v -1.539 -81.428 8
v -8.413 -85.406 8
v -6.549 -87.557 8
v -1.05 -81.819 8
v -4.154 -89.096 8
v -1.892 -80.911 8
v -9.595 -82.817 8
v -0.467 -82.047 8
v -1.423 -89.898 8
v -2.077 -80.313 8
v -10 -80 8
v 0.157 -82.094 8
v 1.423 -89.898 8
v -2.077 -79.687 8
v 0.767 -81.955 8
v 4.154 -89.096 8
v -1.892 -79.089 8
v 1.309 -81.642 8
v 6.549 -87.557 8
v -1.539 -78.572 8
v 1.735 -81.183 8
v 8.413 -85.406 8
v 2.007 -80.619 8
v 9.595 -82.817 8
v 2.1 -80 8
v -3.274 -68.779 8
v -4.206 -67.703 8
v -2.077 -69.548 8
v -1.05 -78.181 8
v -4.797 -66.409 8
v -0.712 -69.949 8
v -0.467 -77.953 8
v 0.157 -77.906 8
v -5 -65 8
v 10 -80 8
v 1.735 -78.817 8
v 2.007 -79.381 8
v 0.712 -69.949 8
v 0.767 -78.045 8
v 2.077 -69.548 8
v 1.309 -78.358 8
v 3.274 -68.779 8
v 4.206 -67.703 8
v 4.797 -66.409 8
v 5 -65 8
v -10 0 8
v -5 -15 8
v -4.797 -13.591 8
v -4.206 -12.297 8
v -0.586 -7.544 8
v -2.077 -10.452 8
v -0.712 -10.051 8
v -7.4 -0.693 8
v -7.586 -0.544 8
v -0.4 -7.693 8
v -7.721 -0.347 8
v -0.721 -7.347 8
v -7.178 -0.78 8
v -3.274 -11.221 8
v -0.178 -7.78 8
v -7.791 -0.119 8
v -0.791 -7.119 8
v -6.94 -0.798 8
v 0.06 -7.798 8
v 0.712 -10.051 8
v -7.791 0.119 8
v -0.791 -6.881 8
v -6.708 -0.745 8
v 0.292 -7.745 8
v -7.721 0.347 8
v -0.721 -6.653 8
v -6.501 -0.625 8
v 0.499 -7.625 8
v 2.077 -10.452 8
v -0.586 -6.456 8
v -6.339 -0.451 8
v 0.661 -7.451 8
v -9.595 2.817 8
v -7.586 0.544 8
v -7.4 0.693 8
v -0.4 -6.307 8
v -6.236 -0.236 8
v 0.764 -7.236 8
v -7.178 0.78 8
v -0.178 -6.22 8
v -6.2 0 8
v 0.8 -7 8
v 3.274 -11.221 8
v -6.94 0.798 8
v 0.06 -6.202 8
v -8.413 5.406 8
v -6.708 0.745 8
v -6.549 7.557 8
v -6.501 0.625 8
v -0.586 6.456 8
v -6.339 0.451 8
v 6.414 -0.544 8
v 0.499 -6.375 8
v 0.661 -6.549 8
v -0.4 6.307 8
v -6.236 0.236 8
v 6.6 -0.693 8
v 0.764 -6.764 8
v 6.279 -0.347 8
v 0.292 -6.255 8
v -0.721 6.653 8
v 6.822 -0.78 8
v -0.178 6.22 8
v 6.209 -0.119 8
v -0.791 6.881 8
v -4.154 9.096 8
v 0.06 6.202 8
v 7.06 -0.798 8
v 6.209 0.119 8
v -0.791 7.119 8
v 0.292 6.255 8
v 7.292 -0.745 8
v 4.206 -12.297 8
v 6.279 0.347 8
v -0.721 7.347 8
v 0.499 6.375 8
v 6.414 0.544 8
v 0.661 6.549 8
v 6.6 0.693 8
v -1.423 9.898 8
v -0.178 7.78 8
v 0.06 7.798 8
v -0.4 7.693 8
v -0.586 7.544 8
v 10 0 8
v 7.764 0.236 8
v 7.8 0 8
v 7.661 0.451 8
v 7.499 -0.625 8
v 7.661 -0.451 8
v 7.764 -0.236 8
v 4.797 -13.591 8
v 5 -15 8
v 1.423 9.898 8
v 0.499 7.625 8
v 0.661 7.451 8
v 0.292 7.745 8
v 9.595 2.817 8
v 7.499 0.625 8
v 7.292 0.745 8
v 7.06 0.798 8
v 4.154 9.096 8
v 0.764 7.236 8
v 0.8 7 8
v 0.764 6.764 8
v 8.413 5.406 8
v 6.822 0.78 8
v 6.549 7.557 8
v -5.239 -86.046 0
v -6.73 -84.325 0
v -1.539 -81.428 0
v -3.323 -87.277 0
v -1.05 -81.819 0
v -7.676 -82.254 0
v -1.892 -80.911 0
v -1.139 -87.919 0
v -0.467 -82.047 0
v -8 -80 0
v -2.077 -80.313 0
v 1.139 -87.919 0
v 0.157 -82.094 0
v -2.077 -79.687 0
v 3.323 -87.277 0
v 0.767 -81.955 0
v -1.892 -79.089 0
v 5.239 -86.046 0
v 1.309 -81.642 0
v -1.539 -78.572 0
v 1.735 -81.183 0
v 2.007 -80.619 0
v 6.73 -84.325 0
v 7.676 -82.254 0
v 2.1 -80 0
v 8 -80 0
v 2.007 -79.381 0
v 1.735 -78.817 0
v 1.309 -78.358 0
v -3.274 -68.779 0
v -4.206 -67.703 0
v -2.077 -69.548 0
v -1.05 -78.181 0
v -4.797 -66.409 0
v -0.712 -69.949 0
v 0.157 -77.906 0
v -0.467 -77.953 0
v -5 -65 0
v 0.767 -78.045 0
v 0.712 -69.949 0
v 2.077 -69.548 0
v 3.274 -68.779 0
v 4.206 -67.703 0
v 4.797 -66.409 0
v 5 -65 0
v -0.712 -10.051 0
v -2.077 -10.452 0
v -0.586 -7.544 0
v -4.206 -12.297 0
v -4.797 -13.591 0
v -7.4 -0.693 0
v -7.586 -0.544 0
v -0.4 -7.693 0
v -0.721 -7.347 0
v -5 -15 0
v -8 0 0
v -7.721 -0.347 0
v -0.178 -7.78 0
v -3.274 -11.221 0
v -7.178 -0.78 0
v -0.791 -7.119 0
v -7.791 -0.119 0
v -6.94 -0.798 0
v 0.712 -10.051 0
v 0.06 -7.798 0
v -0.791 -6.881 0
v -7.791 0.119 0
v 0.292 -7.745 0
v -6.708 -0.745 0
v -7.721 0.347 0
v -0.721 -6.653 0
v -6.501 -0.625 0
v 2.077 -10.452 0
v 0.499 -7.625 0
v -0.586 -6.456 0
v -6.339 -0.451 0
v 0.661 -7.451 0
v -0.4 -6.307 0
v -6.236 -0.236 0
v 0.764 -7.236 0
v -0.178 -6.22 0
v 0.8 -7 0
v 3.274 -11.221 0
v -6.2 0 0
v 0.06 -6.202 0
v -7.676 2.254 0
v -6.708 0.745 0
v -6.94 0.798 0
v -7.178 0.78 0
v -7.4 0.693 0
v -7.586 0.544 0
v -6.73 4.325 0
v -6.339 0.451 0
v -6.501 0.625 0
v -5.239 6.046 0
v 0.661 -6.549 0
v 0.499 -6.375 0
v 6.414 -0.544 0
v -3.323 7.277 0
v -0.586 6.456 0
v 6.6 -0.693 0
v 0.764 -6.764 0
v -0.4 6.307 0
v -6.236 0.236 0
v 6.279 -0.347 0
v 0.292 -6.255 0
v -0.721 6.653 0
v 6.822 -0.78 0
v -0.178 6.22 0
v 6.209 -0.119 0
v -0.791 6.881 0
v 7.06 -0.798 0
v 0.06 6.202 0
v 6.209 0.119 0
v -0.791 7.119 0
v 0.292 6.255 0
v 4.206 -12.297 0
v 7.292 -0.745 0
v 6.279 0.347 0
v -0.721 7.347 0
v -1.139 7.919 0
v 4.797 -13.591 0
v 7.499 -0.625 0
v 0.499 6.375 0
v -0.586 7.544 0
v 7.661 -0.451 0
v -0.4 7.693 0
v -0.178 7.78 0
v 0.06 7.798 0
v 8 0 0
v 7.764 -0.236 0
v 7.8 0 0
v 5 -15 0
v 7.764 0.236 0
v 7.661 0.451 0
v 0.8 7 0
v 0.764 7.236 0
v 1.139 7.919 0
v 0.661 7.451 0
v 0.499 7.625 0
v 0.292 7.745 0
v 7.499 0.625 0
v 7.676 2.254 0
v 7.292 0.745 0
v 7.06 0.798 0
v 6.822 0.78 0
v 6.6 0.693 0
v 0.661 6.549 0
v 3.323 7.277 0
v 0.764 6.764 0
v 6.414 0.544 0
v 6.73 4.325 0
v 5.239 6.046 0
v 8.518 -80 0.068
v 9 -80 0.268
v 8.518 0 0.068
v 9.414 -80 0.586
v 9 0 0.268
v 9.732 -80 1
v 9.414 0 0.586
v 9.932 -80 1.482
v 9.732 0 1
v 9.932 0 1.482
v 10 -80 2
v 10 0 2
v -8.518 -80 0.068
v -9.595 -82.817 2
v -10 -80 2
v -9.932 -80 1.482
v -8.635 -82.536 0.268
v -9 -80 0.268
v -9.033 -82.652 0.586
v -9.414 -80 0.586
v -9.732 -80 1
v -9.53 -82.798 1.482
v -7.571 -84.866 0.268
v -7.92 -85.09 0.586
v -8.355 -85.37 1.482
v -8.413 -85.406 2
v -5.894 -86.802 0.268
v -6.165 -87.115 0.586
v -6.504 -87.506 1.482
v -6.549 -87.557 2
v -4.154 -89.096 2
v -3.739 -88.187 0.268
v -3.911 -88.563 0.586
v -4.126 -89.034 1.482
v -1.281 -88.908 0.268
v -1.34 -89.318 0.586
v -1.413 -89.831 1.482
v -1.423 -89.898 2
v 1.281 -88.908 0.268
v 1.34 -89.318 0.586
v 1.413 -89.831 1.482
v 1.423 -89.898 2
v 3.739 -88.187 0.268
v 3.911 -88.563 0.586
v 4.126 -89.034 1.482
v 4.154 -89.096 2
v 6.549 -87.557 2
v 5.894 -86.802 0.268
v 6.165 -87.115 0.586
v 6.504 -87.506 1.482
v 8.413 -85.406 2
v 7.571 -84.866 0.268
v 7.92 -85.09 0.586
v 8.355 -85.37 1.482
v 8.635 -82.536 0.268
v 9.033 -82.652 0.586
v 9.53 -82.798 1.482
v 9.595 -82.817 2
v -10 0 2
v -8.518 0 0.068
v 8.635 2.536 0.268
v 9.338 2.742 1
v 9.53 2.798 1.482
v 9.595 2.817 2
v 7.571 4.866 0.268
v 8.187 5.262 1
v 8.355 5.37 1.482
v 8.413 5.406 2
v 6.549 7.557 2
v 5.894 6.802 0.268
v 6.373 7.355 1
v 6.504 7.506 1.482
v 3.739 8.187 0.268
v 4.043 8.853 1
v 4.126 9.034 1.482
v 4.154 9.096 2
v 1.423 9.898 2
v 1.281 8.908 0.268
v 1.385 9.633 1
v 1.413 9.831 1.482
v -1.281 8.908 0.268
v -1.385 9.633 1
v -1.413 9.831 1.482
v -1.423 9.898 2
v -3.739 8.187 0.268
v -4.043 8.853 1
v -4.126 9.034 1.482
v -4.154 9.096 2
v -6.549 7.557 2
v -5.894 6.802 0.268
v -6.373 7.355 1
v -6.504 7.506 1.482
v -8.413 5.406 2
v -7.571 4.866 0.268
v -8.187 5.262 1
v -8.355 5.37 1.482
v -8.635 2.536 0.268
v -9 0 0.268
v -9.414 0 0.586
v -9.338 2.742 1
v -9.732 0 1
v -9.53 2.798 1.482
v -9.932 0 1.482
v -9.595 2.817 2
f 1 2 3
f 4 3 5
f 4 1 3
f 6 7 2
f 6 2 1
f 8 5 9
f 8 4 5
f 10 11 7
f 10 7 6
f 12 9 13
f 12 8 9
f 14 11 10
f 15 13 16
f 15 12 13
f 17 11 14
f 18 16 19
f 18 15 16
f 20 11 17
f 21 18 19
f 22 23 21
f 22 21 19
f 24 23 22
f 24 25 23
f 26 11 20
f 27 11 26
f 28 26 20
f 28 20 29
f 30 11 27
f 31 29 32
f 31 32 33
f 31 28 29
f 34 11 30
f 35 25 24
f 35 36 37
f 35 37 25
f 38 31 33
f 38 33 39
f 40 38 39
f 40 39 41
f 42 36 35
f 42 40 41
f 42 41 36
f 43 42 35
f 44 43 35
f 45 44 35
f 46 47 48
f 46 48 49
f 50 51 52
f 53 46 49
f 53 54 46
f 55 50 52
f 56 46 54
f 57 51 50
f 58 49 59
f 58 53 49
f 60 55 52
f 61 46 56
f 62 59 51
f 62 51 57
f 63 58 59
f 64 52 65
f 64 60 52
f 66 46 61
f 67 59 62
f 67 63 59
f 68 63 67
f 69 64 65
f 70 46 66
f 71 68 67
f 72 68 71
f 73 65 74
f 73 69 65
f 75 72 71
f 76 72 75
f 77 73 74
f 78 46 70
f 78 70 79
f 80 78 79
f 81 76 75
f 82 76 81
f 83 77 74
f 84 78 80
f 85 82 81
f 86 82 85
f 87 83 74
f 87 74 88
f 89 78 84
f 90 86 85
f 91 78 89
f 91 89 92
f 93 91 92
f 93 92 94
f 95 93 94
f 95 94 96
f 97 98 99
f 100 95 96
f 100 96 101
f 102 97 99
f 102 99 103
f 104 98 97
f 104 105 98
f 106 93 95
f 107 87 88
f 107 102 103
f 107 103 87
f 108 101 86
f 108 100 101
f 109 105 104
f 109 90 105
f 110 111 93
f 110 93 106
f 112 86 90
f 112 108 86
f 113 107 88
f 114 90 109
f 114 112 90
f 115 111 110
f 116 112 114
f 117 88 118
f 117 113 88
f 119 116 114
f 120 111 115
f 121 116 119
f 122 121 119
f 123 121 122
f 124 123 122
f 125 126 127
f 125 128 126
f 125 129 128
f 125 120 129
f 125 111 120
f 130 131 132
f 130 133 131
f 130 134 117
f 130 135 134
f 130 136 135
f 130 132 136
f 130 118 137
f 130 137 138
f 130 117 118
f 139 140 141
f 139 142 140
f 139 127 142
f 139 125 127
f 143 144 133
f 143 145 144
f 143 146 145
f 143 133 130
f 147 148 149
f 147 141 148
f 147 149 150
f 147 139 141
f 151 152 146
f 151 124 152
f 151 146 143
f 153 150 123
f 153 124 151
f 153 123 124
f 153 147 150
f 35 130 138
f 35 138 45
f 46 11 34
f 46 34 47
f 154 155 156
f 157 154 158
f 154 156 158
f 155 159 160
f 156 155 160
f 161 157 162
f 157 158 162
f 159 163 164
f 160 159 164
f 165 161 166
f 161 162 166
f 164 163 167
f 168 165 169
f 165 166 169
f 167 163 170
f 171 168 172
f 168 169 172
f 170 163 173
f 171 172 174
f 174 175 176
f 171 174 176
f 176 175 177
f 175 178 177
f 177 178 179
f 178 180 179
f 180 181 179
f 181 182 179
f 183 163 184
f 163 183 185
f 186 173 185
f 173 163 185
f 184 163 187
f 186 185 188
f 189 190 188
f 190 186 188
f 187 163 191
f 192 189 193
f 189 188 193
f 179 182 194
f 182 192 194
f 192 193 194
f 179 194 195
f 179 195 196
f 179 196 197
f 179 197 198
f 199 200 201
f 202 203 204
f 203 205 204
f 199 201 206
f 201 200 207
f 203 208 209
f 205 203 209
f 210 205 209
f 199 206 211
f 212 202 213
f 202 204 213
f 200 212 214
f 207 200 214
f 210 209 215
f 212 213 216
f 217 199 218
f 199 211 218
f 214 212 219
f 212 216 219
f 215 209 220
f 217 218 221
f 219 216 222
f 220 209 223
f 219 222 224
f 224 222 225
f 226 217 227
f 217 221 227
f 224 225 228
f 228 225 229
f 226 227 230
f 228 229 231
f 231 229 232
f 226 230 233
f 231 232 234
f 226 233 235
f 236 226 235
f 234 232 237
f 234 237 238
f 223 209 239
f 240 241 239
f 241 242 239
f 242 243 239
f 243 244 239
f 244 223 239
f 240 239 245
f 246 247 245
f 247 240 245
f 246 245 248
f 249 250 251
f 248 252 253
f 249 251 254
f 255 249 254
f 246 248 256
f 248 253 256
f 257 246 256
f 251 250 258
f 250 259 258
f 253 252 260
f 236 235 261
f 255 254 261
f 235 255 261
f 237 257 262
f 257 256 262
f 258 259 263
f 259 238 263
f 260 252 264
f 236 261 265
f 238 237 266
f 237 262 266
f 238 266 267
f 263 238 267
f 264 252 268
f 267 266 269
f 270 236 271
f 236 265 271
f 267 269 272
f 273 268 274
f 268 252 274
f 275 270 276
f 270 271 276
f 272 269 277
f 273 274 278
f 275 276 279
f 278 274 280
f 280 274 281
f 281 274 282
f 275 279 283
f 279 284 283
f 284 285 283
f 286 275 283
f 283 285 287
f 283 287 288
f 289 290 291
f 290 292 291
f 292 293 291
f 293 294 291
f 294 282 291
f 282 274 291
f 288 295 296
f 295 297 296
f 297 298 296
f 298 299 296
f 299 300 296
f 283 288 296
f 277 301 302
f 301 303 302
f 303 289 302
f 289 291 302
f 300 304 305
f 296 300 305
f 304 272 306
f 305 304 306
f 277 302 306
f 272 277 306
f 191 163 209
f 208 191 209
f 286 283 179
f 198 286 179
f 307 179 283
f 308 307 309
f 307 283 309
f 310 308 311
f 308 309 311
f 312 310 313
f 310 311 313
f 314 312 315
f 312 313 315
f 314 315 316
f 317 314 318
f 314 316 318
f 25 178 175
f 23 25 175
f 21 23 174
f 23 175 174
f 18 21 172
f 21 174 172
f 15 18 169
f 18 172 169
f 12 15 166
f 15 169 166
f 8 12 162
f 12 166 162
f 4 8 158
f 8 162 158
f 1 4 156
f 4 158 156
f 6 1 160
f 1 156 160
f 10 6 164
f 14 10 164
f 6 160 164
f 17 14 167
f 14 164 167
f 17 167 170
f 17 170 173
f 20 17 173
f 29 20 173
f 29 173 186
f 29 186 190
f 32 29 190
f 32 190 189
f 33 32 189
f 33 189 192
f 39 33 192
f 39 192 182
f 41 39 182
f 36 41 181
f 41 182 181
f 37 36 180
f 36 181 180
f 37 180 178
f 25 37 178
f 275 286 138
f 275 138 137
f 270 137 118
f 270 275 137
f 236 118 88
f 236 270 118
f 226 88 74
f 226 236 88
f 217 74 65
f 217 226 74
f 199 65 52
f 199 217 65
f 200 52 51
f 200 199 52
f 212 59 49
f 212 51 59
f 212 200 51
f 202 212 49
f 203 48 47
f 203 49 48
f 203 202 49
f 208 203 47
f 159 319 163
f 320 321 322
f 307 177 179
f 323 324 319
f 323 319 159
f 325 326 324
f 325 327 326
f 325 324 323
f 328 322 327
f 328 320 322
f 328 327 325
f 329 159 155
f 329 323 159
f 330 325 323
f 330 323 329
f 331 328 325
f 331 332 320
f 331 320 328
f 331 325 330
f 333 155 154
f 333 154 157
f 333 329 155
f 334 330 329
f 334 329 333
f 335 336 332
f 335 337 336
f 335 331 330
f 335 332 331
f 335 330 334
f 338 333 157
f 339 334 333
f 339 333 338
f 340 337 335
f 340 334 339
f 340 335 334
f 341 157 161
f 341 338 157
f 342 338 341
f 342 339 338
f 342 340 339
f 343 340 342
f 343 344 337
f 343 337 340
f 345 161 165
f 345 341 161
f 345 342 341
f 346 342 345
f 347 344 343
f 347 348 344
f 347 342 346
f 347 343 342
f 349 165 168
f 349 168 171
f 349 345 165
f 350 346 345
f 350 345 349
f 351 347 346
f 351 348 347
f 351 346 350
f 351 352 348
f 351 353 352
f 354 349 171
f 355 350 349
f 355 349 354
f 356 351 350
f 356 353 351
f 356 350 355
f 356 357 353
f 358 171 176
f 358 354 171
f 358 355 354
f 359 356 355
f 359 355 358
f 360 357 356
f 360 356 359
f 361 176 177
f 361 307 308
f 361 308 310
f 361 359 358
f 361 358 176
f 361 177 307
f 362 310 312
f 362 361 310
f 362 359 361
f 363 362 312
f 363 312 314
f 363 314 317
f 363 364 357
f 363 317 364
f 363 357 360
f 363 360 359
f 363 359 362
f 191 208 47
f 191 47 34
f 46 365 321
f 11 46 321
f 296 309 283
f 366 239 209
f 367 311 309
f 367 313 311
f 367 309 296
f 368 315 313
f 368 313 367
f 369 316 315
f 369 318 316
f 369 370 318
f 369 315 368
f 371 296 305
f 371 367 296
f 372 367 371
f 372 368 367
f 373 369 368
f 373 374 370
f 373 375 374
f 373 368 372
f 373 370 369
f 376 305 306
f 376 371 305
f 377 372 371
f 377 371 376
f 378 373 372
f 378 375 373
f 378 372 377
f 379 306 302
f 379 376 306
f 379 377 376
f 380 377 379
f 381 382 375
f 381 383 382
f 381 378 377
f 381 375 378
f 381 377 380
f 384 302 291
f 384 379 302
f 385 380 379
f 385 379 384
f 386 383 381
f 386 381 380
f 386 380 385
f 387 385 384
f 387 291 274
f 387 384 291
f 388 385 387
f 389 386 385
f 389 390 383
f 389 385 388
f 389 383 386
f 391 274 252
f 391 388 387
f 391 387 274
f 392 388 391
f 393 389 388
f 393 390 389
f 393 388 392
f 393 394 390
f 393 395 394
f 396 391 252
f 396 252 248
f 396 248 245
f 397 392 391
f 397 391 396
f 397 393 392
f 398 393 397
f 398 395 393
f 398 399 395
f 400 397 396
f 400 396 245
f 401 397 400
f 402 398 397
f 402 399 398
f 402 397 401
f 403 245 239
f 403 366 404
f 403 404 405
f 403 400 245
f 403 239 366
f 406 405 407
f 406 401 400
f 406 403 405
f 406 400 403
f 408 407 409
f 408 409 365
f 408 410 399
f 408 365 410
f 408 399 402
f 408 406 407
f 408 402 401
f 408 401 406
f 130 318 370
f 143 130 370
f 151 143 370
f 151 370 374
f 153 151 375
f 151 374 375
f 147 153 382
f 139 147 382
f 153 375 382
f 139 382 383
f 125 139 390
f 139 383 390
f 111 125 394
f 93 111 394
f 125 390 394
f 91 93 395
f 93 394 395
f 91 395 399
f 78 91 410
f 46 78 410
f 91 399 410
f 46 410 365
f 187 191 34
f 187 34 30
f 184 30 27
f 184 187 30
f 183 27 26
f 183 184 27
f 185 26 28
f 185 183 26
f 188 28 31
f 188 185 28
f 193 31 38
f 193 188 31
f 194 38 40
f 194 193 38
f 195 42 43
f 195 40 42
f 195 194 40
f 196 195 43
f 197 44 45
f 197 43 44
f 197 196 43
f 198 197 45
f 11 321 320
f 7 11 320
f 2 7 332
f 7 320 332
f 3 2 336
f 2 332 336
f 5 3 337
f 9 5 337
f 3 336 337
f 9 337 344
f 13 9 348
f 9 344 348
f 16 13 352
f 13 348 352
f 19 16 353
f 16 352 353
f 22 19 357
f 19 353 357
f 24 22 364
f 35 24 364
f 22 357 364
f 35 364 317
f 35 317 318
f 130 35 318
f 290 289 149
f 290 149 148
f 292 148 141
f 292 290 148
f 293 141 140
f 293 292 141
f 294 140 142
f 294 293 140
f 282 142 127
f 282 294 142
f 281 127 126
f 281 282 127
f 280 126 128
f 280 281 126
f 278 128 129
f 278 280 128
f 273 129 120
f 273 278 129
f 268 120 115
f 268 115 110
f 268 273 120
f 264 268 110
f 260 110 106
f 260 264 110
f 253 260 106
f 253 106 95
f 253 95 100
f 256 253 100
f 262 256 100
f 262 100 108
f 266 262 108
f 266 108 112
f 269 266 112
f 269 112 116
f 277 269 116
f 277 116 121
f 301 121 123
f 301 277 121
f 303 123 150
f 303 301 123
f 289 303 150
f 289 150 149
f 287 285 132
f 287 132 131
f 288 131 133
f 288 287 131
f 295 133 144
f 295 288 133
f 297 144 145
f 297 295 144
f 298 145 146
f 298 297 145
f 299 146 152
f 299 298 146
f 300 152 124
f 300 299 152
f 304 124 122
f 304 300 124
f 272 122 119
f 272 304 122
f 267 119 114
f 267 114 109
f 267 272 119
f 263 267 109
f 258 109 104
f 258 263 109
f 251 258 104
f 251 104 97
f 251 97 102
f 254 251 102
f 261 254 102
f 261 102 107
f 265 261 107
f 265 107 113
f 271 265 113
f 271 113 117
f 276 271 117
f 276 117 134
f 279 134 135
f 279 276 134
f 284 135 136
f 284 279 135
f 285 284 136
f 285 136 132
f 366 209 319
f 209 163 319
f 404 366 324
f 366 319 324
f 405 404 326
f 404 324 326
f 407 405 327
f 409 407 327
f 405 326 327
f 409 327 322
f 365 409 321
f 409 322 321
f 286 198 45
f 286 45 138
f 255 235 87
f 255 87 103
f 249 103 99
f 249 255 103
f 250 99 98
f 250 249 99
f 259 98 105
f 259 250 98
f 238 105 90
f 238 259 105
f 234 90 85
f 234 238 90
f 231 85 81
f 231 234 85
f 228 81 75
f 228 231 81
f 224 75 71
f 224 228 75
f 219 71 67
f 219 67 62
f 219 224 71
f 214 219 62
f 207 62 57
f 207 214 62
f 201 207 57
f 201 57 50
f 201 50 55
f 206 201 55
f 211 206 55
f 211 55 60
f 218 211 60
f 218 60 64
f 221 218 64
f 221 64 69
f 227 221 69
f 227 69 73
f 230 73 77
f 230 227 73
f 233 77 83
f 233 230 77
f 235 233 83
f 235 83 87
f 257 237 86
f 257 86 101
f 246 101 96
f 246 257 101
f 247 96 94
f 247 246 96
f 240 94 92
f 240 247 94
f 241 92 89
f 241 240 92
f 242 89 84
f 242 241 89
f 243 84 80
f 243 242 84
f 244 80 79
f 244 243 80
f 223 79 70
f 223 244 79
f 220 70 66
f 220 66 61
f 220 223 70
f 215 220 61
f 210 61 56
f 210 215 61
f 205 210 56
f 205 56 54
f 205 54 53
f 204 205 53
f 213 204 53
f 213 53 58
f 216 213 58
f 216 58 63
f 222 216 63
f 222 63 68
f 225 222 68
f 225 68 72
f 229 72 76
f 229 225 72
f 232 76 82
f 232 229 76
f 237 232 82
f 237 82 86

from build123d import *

# Parameters (mm, degrees)
SKETCH1_R           = 10
SKETCH1_R_2         = 0.8
BOSS_EXTRUDE1_DEPTH = 8
FILLET1_R           = 2
CUT_EXTRUDE1_DEPTH  = 60


with BuildPart() as part:
    # Sketch1 → Boss-Extrude1 (new body)
    # profile 1 of 6: a face of its own
    with BuildSketch(Plane.XY):
        with BuildLine():
            ThreePointArc((10, 0), (0, -10), (-10, 0))
            Line((-10, 0), (-10, -80))
            ThreePointArc((-10, -80), (0, -70), (10, -80))
            Line((10, -80), (10, 0))
        make_face()
    # profile 2 of 6: a face of its own
    with BuildSketch(Plane.XY):
        Circle(SKETCH1_R)
        with Locations((-7, 0)):
            Circle(SKETCH1_R_2, mode=Mode.SUBTRACT)
        with Locations((0, -7)):
            Circle(SKETCH1_R_2, mode=Mode.SUBTRACT)
        with Locations((7, 0)):
            Circle(SKETCH1_R_2, mode=Mode.SUBTRACT)
        with Locations((0, 7)):
            Circle(SKETCH1_R_2, mode=Mode.SUBTRACT)
    # profile 3 of 6: a face of its own
    with BuildSketch(Plane.XY):
        with BuildLine():
            ThreePointArc((10, -80), (0, -70), (-10, -80))
            Line((-10, -80), (-2.1, -80))
            ThreePointArc((-2.1, -80), (0, -77.9), (2.1, -80))
            Line((2.1, -80), (10, -80))
        make_face()
    # profile 4 of 6: a face of its own
    with BuildSketch(Plane.XY):
        with BuildLine():
            Line((-2.1, -80), (-10, -80))
            ThreePointArc((-10, -80), (0, -90), (10, -80))
            Line((10, -80), (2.1, -80))
            ThreePointArc((2.1, -80), (0, -82.1), (-2.1, -80))
        make_face()
    # profile 5 of 6: a face of its own
    with BuildSketch(Plane.XY):
        with BuildLine():
            ThreePointArc((10, -80), (0, -70), (-10, -80))
            Line((-10, -80), (-2.1, -80))
            ThreePointArc((-2.1, -80), (0, -77.9), (2.1, -80))
            Line((2.1, -80), (10, -80))
        make_face()
    # profile 6 of 6: a face of its own
    with BuildSketch(Plane.XY):
        with BuildLine():
            Line((-2.1, -80), (-10, -80))
            ThreePointArc((-10, -80), (0, -90), (10, -80))
            Line((10, -80), (2.1, -80))
            ThreePointArc((2.1, -80), (0, -82.1), (-2.1, -80))
        make_face()
    extrude(amount=BOSS_EXTRUDE1_DEPTH)

    # Fillet1
    fillet1_edges = [part.edges().sort_by_distance(p)[0] for p in [
        (-10, -40, 0),
        (0, 10, 0),
        (10, -40, 0),
        (0, -90, 0),
    ]]
    fillet(fillet1_edges, radius=FILLET1_R)

    # Sketch3 → Cut-Extrude1 (cut)
    with BuildSketch(Plane(origin=(0, 0, 0), x_dir=(-1, 0, 0), z_dir=(0, 0, -1))):
        with BuildLine():
            Line((-5, -65), (-5, -15))
            ThreePointArc((-5, -15), (0, -10), (5, -15))
            Line((5, -15), (5, -65))
            ThreePointArc((5, -65), (0, -70), (-5, -65))
        make_face()
    extrude(amount=-CUT_EXTRUDE1_DEPTH, mode=Mode.SUBTRACT)


solid = part.part
